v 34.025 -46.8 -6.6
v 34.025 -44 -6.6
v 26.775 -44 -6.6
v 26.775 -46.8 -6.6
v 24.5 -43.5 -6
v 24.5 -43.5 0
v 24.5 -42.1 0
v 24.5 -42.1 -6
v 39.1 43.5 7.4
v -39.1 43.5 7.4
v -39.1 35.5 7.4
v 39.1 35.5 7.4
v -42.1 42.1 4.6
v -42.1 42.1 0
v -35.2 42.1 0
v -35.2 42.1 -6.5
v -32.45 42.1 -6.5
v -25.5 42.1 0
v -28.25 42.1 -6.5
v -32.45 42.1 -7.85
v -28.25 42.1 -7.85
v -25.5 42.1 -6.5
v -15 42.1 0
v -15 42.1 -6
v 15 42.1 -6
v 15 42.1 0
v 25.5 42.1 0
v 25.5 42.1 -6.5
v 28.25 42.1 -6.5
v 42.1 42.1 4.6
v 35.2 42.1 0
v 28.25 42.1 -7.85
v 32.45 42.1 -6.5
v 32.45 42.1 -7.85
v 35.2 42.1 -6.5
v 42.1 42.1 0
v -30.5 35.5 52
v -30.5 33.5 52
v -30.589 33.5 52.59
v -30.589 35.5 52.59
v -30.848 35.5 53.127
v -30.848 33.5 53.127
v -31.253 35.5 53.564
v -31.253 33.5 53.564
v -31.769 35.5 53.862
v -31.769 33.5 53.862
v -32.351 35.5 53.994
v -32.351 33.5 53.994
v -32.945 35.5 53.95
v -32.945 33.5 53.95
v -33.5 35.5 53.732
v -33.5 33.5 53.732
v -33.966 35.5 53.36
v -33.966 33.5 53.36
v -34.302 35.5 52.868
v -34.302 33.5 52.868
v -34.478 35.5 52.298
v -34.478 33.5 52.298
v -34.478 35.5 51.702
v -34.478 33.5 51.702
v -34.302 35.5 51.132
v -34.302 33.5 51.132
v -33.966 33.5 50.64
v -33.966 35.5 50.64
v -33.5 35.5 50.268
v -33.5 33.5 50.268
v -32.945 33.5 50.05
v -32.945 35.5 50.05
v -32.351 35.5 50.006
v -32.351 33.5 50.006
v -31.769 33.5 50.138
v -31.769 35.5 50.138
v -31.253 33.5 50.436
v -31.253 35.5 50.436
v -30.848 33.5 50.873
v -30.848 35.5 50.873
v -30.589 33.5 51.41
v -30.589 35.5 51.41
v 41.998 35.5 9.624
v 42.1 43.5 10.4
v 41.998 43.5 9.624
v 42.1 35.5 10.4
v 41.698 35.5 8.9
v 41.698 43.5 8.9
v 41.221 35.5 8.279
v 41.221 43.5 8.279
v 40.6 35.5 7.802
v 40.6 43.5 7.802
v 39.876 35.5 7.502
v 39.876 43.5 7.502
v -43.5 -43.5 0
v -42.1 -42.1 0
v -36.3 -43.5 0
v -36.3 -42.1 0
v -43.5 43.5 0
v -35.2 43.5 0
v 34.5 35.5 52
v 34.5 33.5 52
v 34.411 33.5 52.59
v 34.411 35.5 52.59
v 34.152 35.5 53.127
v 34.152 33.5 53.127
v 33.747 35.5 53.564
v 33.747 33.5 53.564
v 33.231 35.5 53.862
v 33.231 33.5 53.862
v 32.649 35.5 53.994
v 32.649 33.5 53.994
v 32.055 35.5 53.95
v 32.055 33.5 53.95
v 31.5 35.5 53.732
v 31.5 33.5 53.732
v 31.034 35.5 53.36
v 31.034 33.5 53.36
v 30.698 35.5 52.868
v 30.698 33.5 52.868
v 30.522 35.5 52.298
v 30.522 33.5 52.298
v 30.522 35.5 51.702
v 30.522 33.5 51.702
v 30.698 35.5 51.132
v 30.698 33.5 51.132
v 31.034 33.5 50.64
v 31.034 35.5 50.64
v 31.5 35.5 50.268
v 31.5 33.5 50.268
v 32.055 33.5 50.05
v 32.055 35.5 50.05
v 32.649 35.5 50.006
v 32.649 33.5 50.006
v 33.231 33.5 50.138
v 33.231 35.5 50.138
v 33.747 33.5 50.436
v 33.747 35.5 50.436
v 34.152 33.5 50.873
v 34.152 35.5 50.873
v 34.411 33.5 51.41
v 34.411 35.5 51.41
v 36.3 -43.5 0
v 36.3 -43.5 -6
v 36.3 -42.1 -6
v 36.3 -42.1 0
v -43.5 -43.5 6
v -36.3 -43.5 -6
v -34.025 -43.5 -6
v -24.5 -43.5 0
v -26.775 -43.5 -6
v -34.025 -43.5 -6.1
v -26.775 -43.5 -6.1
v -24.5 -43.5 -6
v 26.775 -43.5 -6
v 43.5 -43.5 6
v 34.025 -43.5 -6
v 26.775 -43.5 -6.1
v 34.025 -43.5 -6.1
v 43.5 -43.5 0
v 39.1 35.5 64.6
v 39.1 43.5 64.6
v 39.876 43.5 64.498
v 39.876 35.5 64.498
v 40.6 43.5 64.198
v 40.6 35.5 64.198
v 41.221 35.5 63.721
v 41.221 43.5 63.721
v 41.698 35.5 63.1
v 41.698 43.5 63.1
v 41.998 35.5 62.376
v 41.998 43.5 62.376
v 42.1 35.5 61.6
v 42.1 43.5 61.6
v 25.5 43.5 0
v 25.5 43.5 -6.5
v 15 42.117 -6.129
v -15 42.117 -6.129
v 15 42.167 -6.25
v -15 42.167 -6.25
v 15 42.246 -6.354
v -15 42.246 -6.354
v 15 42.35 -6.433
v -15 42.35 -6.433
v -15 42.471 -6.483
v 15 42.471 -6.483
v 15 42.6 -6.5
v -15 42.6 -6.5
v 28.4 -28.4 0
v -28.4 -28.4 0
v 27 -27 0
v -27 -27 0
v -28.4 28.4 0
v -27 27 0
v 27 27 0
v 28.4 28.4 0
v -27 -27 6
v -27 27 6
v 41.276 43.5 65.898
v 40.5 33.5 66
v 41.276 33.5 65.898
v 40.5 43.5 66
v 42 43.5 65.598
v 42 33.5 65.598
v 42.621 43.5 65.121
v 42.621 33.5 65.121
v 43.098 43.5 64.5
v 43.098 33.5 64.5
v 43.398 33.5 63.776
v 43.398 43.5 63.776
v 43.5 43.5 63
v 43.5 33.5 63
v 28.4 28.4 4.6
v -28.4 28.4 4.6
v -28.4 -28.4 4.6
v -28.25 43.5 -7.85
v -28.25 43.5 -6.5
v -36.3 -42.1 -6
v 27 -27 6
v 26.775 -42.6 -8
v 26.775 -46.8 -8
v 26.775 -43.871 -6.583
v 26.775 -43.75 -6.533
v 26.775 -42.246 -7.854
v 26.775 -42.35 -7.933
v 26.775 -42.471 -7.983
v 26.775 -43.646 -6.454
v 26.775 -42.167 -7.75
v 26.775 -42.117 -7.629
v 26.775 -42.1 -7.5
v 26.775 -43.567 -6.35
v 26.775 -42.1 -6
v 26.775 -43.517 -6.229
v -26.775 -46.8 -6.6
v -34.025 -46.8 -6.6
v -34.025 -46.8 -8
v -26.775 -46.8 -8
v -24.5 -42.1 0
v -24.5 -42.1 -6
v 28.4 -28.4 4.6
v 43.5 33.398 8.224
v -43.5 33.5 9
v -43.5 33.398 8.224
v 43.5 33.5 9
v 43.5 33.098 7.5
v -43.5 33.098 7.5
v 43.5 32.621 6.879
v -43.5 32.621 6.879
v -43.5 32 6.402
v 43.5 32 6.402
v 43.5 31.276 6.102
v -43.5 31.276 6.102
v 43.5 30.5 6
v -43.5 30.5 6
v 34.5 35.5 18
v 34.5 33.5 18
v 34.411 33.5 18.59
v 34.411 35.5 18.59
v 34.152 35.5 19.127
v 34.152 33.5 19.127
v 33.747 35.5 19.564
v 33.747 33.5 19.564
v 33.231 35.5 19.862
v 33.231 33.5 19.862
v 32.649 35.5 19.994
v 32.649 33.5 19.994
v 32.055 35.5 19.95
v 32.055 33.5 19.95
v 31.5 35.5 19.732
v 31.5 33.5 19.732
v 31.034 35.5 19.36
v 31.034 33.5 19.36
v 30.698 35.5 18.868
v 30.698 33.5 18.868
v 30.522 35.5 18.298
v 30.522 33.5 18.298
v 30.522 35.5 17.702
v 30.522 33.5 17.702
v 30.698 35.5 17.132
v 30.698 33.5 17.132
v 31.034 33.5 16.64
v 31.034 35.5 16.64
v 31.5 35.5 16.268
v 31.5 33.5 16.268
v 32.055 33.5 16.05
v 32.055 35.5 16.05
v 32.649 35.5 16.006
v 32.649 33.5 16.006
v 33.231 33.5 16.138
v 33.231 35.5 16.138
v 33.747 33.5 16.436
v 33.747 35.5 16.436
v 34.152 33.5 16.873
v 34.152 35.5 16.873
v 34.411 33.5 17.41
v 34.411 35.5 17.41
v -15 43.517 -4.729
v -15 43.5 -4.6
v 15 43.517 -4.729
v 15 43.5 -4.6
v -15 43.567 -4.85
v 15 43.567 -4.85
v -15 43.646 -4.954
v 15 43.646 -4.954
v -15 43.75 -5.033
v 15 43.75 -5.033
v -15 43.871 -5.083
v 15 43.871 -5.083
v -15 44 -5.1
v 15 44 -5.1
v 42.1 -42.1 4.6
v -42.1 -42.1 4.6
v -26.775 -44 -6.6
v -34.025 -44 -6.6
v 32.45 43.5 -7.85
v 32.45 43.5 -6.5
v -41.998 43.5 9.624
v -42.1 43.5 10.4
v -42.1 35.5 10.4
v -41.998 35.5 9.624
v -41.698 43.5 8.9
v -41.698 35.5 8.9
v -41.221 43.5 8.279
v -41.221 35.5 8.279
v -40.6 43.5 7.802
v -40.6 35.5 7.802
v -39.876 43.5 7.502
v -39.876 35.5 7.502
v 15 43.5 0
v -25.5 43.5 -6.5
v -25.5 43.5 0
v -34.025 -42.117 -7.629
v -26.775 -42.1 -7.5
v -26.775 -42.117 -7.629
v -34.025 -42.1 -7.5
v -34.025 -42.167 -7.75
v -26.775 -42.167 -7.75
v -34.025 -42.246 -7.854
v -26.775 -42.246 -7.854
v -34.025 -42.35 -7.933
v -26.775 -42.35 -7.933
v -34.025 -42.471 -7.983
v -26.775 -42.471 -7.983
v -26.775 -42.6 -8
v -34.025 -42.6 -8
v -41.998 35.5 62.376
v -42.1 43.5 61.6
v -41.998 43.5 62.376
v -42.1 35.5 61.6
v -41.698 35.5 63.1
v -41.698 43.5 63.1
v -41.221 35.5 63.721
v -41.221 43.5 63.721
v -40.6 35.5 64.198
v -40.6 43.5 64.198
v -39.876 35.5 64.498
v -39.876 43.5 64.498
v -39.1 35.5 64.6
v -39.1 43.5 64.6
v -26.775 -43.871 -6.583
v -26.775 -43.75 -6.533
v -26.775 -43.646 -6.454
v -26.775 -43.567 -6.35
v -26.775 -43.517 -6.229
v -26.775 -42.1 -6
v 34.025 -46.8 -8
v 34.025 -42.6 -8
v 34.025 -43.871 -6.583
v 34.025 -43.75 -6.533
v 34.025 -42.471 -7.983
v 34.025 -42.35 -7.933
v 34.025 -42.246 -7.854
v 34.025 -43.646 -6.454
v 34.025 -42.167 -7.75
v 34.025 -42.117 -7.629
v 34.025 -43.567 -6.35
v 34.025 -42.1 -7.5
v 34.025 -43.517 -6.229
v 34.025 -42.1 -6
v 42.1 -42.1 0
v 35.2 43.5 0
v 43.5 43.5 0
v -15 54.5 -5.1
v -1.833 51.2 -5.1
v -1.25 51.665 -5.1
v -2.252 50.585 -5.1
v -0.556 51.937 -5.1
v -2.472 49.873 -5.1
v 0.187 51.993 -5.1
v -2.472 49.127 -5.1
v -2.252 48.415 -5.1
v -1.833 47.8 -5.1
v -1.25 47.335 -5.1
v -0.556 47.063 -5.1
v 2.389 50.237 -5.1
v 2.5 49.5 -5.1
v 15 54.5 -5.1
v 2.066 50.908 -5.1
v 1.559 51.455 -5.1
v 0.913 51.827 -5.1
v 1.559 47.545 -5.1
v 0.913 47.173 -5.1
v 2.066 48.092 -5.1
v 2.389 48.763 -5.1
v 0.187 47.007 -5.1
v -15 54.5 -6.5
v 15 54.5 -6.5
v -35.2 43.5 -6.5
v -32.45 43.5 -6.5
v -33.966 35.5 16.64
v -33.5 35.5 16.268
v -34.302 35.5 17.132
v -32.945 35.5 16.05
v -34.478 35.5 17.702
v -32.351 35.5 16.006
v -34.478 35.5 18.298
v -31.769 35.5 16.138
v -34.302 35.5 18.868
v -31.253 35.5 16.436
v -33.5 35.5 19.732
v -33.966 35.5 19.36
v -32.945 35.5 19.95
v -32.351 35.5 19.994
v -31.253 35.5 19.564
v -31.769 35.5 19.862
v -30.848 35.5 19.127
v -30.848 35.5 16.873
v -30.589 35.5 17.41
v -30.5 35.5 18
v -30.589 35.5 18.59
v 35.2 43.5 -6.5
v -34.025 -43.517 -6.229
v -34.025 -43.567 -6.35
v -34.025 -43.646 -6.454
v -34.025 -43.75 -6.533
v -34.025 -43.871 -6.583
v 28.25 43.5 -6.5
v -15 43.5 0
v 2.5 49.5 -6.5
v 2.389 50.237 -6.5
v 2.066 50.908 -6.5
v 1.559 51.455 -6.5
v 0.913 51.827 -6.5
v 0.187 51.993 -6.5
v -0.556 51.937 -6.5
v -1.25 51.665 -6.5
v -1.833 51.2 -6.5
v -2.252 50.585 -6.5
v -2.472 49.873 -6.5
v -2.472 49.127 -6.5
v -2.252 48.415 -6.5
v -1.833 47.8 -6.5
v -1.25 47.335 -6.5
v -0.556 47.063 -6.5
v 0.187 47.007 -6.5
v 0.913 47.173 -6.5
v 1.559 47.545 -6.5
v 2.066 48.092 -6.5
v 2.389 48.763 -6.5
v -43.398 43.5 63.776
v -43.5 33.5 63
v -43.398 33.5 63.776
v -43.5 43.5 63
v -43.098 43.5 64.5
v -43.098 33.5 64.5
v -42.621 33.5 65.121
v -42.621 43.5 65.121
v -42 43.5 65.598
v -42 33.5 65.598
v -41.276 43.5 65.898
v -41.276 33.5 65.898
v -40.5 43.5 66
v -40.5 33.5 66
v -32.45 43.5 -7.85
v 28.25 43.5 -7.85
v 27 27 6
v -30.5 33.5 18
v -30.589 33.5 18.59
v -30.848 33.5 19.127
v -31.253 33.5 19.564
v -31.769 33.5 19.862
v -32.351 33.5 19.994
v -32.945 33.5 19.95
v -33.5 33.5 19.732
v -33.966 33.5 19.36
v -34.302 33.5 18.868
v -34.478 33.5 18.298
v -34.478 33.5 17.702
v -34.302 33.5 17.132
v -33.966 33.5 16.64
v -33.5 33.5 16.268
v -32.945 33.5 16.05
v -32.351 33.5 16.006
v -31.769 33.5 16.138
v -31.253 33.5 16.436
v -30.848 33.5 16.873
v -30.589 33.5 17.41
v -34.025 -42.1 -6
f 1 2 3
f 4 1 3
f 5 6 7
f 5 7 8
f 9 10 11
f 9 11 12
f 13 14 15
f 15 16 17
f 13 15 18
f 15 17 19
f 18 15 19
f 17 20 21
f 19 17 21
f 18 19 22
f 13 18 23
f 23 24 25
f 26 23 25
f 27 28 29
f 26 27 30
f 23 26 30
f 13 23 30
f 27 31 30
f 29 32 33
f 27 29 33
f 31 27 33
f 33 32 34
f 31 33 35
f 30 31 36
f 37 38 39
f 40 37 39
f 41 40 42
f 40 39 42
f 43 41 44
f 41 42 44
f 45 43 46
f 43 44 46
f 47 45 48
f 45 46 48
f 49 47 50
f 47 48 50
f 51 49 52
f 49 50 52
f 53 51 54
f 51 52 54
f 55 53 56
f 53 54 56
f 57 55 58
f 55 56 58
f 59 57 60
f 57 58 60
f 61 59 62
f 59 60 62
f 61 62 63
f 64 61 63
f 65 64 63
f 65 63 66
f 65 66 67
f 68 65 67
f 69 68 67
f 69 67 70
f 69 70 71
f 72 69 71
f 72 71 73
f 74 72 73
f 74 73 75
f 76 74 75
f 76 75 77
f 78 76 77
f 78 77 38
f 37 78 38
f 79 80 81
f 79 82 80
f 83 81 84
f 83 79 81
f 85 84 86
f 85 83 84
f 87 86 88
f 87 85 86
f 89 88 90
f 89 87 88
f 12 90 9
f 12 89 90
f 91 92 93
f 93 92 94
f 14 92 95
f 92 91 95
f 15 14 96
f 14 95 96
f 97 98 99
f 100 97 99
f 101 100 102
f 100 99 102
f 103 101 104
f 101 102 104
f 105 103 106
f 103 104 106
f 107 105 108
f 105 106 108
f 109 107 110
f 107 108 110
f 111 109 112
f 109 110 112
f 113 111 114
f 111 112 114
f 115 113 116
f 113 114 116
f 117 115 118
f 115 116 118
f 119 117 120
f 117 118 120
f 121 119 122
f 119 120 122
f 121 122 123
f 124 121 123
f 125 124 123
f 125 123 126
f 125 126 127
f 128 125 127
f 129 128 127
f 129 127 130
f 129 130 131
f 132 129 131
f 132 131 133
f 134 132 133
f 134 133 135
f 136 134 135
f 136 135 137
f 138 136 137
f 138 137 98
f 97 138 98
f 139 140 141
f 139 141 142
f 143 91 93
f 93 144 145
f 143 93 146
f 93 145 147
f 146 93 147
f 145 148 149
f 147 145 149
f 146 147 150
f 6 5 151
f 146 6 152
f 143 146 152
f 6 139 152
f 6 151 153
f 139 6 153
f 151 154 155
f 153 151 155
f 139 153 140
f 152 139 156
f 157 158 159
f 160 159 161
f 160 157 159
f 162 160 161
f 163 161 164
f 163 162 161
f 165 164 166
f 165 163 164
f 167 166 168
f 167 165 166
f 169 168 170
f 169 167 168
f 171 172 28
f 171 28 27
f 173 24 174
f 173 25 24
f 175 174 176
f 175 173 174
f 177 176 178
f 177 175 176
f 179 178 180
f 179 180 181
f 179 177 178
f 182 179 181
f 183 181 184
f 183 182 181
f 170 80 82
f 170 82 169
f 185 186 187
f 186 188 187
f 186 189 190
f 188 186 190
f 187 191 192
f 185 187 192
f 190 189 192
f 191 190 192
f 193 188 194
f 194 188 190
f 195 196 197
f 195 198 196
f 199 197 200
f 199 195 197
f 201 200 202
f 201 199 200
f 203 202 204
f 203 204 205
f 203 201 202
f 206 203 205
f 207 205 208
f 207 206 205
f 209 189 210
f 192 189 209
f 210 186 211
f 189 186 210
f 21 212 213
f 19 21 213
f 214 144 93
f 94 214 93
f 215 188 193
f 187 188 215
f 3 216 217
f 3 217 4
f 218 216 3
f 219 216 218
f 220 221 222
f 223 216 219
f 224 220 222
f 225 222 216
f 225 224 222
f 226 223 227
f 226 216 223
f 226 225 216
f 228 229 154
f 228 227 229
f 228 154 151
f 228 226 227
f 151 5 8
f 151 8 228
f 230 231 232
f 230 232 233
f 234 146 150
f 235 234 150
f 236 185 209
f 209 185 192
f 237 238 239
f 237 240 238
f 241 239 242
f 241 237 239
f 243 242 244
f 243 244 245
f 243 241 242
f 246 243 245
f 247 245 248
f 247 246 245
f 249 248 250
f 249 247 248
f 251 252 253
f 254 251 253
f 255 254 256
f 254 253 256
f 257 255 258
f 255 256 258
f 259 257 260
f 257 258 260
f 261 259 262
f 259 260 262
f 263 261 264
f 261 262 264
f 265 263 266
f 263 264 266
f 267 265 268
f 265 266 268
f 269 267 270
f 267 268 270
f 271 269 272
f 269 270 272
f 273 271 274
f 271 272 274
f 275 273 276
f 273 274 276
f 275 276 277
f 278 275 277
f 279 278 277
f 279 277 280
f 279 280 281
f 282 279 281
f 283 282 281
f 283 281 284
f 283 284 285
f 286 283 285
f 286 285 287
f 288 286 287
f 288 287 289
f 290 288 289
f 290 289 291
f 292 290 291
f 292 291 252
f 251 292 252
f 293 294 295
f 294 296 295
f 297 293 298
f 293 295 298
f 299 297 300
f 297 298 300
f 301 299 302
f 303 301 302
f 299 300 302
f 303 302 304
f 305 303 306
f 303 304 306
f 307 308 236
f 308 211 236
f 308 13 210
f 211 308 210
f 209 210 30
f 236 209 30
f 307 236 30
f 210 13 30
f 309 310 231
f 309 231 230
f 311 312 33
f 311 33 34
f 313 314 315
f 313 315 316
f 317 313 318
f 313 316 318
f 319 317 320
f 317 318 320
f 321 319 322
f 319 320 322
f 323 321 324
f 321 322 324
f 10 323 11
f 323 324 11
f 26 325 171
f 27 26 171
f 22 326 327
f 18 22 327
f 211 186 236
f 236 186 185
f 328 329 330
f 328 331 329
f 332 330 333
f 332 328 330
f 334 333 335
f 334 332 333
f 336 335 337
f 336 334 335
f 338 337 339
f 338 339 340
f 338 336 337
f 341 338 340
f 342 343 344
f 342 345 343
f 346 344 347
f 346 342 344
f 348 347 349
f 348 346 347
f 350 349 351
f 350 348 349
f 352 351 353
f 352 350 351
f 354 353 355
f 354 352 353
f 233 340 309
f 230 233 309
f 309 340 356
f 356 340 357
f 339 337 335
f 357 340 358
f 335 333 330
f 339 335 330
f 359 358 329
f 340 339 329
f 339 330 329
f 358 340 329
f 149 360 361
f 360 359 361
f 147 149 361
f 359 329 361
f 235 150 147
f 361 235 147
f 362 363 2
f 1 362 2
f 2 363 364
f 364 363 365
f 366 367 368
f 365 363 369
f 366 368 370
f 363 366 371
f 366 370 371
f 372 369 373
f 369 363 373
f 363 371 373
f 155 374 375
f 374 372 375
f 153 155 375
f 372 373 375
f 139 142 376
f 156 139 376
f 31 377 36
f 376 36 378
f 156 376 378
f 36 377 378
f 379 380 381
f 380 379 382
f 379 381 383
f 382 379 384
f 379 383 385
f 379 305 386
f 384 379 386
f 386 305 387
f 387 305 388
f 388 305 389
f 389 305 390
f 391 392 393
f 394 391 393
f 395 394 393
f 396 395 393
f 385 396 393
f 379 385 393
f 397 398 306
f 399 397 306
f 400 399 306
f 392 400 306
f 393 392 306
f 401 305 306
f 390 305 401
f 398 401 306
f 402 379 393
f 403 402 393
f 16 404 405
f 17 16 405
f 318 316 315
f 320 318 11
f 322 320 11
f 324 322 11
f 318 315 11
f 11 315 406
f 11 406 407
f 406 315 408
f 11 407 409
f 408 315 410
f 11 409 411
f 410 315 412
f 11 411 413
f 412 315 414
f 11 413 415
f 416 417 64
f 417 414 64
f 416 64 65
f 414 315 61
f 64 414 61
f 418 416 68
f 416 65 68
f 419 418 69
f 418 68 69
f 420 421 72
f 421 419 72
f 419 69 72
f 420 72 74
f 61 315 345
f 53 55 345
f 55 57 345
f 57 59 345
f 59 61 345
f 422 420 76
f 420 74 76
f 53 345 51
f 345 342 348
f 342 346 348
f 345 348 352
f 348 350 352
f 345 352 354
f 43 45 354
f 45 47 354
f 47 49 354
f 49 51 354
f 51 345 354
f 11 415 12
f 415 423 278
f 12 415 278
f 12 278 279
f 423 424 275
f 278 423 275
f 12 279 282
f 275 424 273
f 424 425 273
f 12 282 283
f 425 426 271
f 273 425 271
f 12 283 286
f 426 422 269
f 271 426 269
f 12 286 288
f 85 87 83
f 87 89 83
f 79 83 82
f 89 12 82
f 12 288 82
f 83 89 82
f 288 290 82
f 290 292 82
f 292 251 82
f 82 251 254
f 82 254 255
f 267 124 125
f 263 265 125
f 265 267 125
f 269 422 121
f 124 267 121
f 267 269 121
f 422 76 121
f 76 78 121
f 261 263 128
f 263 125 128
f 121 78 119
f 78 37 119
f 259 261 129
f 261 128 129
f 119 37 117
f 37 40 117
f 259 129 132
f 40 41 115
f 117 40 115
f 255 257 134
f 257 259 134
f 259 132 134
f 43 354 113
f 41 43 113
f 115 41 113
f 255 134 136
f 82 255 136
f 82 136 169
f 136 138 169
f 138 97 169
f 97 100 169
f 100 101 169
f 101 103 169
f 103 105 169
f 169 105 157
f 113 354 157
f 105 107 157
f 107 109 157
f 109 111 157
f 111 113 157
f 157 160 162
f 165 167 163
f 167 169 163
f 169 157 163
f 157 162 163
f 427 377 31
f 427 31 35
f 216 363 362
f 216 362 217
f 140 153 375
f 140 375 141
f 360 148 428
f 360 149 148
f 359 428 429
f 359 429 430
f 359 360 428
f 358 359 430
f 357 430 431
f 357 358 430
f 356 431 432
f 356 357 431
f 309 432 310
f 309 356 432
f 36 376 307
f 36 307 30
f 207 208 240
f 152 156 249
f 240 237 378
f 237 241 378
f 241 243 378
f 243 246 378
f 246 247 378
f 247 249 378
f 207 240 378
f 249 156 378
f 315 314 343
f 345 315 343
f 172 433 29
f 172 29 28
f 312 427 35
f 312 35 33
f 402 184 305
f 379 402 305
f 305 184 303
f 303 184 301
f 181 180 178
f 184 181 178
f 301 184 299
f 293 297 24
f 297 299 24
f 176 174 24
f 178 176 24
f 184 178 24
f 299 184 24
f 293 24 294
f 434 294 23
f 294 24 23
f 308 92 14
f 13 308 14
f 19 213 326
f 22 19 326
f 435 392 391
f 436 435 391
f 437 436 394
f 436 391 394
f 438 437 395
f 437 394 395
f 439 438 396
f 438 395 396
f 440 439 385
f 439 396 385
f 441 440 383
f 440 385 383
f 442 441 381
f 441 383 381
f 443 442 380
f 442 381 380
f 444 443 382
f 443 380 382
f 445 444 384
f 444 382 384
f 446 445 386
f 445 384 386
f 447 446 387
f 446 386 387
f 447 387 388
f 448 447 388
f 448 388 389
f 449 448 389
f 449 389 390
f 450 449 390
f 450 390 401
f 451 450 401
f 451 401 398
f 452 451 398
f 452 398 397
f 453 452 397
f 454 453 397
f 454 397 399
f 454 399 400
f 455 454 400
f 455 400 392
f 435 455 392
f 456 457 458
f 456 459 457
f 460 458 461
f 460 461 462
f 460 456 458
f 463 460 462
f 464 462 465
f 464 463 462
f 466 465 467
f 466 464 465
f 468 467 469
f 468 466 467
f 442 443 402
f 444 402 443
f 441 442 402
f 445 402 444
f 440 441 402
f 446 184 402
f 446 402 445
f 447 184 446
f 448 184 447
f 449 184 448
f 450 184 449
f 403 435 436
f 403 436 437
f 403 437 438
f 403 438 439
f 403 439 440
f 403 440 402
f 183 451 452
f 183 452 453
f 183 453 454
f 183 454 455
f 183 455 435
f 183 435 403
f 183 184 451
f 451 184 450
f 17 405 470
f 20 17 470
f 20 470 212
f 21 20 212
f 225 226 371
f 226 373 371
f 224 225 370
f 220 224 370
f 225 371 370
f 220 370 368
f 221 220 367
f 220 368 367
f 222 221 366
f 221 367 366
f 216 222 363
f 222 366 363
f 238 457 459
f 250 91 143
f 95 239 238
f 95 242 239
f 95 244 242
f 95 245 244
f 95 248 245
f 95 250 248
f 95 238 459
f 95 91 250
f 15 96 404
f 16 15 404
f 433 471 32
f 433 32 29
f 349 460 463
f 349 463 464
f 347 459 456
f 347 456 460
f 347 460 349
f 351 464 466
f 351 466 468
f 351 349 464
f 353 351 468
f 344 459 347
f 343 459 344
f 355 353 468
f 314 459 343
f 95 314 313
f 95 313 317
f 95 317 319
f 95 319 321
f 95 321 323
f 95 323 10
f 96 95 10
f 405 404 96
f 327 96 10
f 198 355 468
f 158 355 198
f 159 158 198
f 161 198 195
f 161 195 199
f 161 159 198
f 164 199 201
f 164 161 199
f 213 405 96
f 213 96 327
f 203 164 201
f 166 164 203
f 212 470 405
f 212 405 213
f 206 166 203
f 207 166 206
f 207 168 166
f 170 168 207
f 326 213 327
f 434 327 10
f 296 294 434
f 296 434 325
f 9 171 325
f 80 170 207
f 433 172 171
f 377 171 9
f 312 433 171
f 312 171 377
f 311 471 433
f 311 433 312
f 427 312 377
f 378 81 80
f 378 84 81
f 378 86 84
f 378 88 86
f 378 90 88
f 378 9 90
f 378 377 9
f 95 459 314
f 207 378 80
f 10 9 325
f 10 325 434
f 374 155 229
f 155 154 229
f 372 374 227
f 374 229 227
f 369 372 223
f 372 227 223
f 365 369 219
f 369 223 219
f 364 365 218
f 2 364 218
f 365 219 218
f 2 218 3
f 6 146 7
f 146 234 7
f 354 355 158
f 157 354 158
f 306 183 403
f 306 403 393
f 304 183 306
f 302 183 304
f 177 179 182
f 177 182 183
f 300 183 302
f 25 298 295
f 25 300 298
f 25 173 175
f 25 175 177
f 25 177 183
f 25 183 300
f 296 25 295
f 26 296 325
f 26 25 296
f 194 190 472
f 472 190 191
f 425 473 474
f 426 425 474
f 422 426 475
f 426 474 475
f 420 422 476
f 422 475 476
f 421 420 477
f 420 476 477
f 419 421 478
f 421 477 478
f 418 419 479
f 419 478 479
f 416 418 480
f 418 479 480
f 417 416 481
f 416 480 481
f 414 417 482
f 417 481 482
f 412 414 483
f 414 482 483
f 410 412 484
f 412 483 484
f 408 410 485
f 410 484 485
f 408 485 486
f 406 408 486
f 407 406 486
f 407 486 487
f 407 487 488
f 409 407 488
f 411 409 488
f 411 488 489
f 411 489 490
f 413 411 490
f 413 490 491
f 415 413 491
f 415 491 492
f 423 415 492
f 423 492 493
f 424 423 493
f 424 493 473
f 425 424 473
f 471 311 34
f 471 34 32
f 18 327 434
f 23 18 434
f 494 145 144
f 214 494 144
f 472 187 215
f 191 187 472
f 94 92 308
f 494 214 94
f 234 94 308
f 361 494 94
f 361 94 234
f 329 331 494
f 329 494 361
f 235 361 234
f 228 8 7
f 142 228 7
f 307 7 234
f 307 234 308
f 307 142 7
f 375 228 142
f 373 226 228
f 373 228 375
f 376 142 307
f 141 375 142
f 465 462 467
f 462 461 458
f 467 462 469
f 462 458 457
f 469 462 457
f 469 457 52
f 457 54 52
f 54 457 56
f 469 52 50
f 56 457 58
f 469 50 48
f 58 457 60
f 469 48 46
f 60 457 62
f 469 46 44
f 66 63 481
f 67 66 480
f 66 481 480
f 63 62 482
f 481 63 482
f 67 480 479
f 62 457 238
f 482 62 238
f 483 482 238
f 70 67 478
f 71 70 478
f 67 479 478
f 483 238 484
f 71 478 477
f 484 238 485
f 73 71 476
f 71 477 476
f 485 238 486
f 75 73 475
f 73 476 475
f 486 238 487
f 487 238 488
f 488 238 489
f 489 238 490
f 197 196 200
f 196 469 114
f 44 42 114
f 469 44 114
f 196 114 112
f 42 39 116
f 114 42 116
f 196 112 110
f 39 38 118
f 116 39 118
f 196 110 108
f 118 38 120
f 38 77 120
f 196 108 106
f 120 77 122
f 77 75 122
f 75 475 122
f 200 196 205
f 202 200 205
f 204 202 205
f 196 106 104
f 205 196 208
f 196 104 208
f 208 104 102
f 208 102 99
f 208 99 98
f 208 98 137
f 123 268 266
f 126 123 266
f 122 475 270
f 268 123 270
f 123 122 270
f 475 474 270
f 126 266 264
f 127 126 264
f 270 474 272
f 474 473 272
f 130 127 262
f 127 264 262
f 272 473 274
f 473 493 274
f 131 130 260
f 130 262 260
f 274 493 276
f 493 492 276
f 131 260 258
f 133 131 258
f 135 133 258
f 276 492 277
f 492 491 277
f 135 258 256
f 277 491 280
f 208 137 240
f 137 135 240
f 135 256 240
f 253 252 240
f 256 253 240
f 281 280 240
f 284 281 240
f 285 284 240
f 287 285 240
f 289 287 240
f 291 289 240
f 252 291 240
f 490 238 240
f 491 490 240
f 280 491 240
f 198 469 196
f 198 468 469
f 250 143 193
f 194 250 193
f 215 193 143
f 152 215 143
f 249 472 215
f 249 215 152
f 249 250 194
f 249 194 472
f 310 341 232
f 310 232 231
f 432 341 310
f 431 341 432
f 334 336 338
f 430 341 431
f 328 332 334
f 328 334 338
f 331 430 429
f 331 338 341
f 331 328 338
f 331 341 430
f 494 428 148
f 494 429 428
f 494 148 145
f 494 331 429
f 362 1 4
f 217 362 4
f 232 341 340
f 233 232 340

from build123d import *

# Parameters (mm, degrees)
SKETCH_W        = 87
SKETCH_H        = 87
SKETCH_W_2      = 54
SKETCH_H_2      = 54
PAD_DEPTH       = 6
SKETCH001_W     = 84.2
SKETCH001_H     = 84.2
SKETCH001_W_2   = 56.8
SKETCH001_H_2   = 56.8
POCKET_DEPTH    = 4.6
PAD001_DEPTH    = 1.4
SKETCH003_W     = 7.25
SKETCH003_H     = 1.4
PAD002_DEPTH    = 3.3
PAD006_DEPTH    = 1.4
SKETCH004_W     = 30
SKETCH004_H     = 6.5
PAD003_DEPTH    = 1.4
SKETCH005_W     = 30
SKETCH005_H     = 1.4
PAD004_DEPTH    = 11
SKETCH008_R     = 2.5
HOLE001_DEPTH   = 8.001
SKETCH006_W     = 87
SKETCH006_H     = 10
PAD005_DEPTH    = 60
SKETCH007_R     = 2
HOLE_DEPTH      = 54.501
SKETCH009_W     = 84.2
SKETCH009_H     = 57.2
POCKET001_DEPTH = 8
FILLET_R        = 3
FILLET001_R     = 0.5


with BuildPart() as part:
    # Sketch → Pad (new body)
    with BuildSketch(Plane.XY):
        Rectangle(SKETCH_W, SKETCH_H)
        Rectangle(SKETCH_W_2, SKETCH_H_2, mode=Mode.SUBTRACT)
    extrude(amount=PAD_DEPTH)

    # Sketch001 → Pocket (cut)
    with BuildSketch(Plane.XY):
        Rectangle(SKETCH001_W, SKETCH001_H)
        Rectangle(SKETCH001_W_2, SKETCH001_H_2, mode=Mode.SUBTRACT)
    extrude(amount=POCKET_DEPTH, mode=Mode.SUBTRACT)

    # Sketch002 (on DatumPlane) → Pad001 (join)
    with BuildSketch(Plane.XZ.offset(43.5)):
        Polygon((-36.3, 0), (-24.5, 0), (-24.5, -6), (-26.775, -6), (-26.775, -8), (-34.025, -8), (-34.025, -6), (-36.3, -6), align=None)
    pad001 = extrude(amount=-PAD001_DEPTH)

    # Sketch003 (on DatumPlane) → Pad002 (join)
    with BuildSketch(Plane.XZ.offset(43.5)):
        with Locations((-30.4, -7.3)):
            Rectangle(SKETCH003_W, SKETCH003_H)
    pad002 = extrude(amount=PAD002_DEPTH)

    # Sketch010 (on DatumPlane) → Pad006 (join)
    with BuildSketch(Plane.XZ.offset(-43.5)):
        Polygon((-25.5, 0), (-35.2, 0), (-35.2, -6.5), (-32.45, -6.5), (-32.45, -7.85), (-28.25, -7.85), (-28.25, -6.5), (-25.5, -6.5), align=None)
    pad006 = extrude(amount=PAD006_DEPTH)

    # Mirrored002: Pad001, Pad002, Pad006 across Sketch003 V_Axis
    add(pad001.mirror(Plane(origin=(0, -43.5, 0), x_dir=(0, -1, 0), z_dir=(1, 0, 0))))
    add(pad002.mirror(Plane(origin=(0, -43.5, 0), x_dir=(0, -1, 0), z_dir=(1, 0, 0))))
    add(pad006.mirror(Plane(origin=(0, -43.5, 0), x_dir=(0, -1, 0), z_dir=(1, 0, 0))))

    # Sketch004 (on DatumPlane) → Pad003 (join)
    with BuildSketch(Plane.XZ.offset(-43.5)):
        with Locations((0, -3.25)):
            Rectangle(SKETCH004_W, SKETCH004_H)
    extrude(amount=PAD003_DEPTH)

    # Sketch005 (on DatumPlane) → Pad004 (join)
    with BuildSketch(Plane.XZ.offset(-43.5)):
        with Locations((0, -5.8)):
            Rectangle(SKETCH005_W, SKETCH005_H)
    extrude(amount=-PAD004_DEPTH)

    # Sketch008 → Hole001 (cut, through all)
    with BuildSketch(Plane.XY):
        with Locations((0, 49.5)):
            Circle(SKETCH008_R)
    extrude(amount=-HOLE001_DEPTH, mode=Mode.SUBTRACT)

    # Sketch006 (on DatumPlane) → Pad005 (join)
    with BuildSketch(Plane.XY.offset(6)):
        with Locations((0, 38.5)):
            Rectangle(SKETCH006_W, SKETCH006_H)
    extrude(amount=PAD005_DEPTH)

    # Sketch007 → Hole (cut, through all)
    with BuildSketch(Plane.XZ):
        with Locations((-32.5, 52)):
            Circle(SKETCH007_R)
        with Locations((32.5, 52)):
            Circle(SKETCH007_R)
        with Locations((-32.5, 18)):
            Circle(SKETCH007_R)
        with Locations((32.5, 18)):
            Circle(SKETCH007_R)
    extrude(amount=-HOLE_DEPTH, mode=Mode.SUBTRACT)

    # Sketch009 (on DatumPlane) → Pocket001 (cut)
    with BuildSketch(Plane.XZ.offset(-43.5)):
        with Locations((0, 36)):
            Rectangle(SKETCH009_W, SKETCH009_H)
    extrude(amount=POCKET001_DEPTH, mode=Mode.SUBTRACT)

    # Fillet
    fillet_edges = [part.edges().sort_by_distance(p)[0] for p in [
        (43.5, 38.5, 66),
        (-43.5, 38.5, 66),
        (-42.1, 39.5, 64.6),
        (42.1, 39.5, 64.6),
        (42.1, 39.5, 7.4),
        (-42.1, 39.5, 7.4),
        (0, 33.5, 6),
    ]]
    fillet(fillet_edges, radius=FILLET_R)

    # Fillet001
    fillet001_edges = [part.edges().sort_by_distance(p)[0] for p in [
        (0, 43.5, -5.1),
        (0, 42.1, -6.5),
        (30.4, -43.5, -6.6),
        (-30.4, -43.5, -6.6),
        (-30.4, -42.1, -8),
        (30.4, -42.1, -8),
    ]]
    fillet(fillet001_edges, radius=FILLET001_R)


solid = part.part
